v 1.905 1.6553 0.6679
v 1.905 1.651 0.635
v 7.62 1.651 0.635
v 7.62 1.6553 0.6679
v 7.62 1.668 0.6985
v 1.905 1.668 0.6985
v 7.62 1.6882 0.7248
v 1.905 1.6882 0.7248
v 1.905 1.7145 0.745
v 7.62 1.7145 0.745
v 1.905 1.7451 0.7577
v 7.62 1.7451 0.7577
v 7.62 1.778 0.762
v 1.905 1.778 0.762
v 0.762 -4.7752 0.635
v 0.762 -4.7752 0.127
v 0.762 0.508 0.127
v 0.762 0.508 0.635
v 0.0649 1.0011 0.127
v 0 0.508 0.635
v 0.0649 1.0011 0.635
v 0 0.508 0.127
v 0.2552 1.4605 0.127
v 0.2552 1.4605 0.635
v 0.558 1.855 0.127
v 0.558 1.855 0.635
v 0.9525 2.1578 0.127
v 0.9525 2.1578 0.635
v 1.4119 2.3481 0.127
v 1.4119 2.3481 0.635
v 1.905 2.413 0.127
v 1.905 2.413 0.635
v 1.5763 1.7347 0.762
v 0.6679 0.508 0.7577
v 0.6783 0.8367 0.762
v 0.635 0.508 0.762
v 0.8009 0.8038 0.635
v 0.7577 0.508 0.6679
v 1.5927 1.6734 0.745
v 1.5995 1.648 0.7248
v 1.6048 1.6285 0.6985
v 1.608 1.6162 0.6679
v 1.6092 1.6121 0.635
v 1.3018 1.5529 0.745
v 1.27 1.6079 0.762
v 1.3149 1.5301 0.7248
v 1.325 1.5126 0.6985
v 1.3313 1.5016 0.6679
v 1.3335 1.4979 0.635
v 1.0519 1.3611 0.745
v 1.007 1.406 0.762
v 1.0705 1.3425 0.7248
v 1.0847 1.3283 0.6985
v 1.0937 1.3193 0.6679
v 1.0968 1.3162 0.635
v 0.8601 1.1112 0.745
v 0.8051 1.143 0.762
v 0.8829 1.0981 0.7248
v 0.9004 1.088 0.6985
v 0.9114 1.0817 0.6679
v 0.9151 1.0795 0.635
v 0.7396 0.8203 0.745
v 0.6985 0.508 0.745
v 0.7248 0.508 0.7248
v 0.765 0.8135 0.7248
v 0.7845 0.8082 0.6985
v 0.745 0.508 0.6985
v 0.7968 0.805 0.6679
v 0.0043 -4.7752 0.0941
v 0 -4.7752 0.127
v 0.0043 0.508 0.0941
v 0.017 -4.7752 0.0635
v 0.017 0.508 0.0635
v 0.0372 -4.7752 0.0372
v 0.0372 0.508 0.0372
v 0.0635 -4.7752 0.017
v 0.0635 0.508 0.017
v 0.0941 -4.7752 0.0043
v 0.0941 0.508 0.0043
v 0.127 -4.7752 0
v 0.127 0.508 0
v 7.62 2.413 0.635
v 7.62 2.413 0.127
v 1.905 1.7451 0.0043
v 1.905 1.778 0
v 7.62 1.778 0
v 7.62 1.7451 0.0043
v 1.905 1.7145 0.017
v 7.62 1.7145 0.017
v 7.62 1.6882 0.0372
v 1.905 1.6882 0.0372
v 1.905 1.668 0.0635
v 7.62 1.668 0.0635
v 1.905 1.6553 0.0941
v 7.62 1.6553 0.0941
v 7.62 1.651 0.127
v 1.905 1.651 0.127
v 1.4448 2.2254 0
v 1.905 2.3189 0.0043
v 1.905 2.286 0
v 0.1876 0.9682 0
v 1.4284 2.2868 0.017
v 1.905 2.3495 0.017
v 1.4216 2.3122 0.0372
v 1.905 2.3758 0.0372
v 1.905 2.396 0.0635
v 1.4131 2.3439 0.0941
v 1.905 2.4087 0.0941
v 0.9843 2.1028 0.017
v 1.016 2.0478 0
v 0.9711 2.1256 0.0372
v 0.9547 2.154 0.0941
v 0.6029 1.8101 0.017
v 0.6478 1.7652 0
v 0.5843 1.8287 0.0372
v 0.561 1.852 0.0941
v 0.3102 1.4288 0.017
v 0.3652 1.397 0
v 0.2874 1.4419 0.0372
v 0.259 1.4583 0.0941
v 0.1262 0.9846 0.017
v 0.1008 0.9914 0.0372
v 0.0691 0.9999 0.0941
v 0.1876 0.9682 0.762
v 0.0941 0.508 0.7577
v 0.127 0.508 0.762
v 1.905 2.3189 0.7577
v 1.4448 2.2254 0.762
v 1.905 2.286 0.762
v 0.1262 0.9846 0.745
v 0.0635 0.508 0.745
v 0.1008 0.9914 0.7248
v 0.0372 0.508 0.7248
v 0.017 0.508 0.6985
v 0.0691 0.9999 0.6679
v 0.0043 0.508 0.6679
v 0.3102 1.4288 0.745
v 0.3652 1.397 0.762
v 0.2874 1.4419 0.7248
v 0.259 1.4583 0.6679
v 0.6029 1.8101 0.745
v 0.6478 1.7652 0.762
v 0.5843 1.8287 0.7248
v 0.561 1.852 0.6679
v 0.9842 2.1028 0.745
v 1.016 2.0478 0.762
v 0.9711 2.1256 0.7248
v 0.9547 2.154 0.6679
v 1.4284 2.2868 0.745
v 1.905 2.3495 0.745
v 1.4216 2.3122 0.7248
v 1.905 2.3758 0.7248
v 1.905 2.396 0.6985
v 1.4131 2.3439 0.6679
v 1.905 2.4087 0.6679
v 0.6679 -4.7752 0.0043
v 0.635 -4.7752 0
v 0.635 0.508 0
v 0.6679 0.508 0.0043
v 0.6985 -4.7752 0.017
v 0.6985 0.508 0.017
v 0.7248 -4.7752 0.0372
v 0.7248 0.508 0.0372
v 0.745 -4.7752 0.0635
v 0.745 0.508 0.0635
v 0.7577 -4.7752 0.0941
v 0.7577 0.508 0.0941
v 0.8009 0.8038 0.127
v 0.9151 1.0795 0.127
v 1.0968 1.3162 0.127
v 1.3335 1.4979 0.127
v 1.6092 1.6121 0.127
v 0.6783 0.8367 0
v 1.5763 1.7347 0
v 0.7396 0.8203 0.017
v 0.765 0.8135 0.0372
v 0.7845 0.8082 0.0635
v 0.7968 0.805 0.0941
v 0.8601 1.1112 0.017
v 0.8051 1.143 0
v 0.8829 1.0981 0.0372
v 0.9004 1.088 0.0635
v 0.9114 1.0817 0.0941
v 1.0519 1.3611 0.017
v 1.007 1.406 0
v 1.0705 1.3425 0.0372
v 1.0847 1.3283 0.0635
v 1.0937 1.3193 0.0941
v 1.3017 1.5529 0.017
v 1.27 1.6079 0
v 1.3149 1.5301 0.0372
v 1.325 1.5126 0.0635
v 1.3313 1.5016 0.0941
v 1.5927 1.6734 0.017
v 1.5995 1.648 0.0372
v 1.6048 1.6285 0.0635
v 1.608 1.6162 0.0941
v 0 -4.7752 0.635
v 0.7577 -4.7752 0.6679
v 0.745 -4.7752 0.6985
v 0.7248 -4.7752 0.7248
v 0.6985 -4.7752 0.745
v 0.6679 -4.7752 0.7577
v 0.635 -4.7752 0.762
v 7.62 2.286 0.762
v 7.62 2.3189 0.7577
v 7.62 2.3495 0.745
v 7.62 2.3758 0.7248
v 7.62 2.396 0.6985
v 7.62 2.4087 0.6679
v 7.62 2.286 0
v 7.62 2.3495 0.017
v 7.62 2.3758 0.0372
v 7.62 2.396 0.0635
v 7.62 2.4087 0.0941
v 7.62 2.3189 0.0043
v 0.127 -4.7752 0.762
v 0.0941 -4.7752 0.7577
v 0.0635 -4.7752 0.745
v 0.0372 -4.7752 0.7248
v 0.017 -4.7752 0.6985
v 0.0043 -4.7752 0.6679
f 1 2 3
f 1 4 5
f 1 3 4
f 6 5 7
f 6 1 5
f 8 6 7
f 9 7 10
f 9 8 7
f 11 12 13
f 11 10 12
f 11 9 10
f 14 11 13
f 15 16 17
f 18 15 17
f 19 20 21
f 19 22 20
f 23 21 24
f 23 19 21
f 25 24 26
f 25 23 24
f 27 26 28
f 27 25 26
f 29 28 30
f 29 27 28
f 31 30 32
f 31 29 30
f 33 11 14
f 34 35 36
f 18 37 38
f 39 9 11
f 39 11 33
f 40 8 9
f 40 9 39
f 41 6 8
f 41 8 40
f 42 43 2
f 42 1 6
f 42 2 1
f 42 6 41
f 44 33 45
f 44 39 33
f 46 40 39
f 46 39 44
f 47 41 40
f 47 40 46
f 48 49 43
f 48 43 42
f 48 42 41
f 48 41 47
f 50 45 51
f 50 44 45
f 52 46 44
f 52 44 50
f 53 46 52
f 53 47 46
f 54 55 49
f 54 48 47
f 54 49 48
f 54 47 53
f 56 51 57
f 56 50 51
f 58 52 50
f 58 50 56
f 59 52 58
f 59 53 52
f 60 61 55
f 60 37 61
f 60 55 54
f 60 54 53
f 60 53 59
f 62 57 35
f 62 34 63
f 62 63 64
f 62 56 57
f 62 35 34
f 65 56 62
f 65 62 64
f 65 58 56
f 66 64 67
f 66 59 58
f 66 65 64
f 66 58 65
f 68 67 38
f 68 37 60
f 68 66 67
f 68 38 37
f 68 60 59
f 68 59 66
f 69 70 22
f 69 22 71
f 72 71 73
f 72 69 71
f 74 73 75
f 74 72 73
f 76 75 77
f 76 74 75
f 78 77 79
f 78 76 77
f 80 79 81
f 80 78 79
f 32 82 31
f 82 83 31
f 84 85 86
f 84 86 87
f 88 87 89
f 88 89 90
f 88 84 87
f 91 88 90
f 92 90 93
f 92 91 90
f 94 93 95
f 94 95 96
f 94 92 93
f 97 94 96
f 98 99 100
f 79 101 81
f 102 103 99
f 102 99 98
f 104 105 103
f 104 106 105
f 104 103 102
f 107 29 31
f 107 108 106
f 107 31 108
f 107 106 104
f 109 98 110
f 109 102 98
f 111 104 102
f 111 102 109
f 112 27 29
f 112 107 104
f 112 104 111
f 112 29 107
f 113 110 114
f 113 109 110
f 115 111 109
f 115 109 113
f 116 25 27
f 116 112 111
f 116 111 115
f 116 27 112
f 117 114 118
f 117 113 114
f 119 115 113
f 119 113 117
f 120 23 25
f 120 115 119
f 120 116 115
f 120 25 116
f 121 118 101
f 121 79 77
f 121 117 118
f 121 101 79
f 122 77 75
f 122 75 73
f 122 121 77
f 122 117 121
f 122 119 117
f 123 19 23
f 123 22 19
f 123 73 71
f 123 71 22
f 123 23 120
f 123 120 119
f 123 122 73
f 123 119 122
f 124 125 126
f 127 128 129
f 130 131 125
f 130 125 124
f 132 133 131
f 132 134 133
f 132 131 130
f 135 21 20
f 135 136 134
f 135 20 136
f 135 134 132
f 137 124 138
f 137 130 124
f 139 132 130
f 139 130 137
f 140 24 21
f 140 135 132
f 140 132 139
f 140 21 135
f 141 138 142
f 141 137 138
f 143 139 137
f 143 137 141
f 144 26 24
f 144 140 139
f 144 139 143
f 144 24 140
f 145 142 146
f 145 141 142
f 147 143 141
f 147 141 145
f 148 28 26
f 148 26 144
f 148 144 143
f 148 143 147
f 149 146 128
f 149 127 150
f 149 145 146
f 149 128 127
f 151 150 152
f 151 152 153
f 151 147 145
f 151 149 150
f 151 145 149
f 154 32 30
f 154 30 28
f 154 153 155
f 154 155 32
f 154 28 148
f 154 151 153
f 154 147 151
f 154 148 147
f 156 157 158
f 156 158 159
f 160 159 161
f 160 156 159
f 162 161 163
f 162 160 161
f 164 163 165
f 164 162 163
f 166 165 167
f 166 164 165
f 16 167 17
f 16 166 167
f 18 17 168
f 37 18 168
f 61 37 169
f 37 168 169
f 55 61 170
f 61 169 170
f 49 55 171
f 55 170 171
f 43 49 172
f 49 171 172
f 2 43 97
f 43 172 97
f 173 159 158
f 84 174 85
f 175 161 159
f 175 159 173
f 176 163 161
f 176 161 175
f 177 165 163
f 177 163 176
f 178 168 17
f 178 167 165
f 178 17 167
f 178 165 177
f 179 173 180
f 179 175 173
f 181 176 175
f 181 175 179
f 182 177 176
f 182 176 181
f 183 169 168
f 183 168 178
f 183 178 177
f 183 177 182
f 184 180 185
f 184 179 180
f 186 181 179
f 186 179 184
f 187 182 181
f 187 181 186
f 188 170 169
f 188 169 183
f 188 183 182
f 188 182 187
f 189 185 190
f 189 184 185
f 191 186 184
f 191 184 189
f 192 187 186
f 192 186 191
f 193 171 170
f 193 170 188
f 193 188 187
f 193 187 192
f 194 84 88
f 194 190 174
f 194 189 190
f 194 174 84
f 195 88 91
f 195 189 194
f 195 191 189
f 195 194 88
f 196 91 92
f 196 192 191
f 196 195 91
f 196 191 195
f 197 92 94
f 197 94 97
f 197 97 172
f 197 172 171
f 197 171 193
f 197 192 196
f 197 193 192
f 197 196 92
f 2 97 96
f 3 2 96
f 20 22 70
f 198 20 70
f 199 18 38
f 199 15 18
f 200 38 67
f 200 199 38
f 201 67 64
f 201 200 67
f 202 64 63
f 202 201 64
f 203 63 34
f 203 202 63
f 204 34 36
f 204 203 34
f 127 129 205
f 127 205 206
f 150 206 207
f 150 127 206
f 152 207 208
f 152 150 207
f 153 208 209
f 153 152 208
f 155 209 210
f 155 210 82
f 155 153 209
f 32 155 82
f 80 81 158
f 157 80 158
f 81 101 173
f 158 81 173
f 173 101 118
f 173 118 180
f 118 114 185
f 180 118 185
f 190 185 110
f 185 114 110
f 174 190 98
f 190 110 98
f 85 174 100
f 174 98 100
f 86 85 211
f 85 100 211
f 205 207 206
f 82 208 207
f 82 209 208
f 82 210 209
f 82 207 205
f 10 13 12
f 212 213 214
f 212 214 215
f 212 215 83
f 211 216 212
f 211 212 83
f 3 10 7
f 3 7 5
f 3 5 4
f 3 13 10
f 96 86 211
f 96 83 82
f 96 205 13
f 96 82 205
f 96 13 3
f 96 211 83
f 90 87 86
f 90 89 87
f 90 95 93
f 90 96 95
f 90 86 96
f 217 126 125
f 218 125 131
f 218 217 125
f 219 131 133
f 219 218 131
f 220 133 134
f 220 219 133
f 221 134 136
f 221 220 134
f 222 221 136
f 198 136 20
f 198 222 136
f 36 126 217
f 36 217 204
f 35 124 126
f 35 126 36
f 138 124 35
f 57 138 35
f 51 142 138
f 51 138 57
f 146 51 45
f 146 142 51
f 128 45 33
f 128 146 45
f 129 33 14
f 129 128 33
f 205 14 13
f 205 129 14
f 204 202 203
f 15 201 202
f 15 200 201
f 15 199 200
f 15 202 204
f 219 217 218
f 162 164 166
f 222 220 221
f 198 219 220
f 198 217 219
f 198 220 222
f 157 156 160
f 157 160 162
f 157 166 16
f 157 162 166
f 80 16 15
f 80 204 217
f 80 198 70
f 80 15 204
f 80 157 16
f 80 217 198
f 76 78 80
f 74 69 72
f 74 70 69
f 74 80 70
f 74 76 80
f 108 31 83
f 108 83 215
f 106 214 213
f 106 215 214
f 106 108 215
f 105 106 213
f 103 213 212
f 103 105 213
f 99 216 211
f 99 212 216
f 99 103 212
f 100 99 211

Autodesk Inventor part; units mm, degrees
ref_plane "YZ Plane" through (0, 0, 0) normal (1, 0, 0) x (0, 1, 0)
ref_plane "XZ Plane" through (0, 0, 0) normal (0, 1, 0) x (-1, 0, 0)
ref_plane "XY Plane" through (0, 0, 0) normal (0, 0, 1) x (1, 0, 0)
sketch "Sketch1" plane through (0, 0, 0) normal (0, 0, 1) x (1, 0, 0)
  line L0 (7.62, 2.413) -> (1.905, 2.413)
  line L1 (0, 0.508) -> (0, 0)
  line L2 (0.762, 0) -> (0.762, 0.508)
  line L3 (1.905, 1.651) -> (7.62, 1.651)
  arc A0 (1.905, 1.651) -> (0.762, 0.508) centre (1.905, 0.508) ccw
  arc A1 (1.905, 2.413) -> (0, 0.508) centre (1.905, 0.508) ccw
  line L4 (7.62, 2.413) -> (7.62, 1.651)
  line L5 (0.762, 0) -> (0, 0)
  line L6 (0.762, -4.7752) -> (0, -4.7752)
  line L7 (0, -4.7752) -> (0, 0)
  line L8 (0, 0) -> (0.762, 0)
  line L9 (0.762, 0) -> (0.762, -4.7752)
  point P0 (0, 2.413)
  dimension "d0" = 7.62
  dimension "d1" = 0.762
  dimension "d2" = 1.143
  dimension "d3" = 1.905
  dimension "d4" = 2.413
  dimension "d5" = 4.7752
extrude "Extrusion1" add sketch "Sketch1" along normal blind 0.762
fillet "Fillet2" radius 0.127 8 edges at (1.0968, 1.3162, 0.762) (4.7625, 1.651, 0.762) (0.558, 1.855, 0.762) (4.7625, 2.413, 0.762) (0.558, 1.855, 0) (4.7625, 2.413, 0) (1.0968, 1.3162, 0) (4.7625, 1.651, 0)
properties part number "90d pin_header"
